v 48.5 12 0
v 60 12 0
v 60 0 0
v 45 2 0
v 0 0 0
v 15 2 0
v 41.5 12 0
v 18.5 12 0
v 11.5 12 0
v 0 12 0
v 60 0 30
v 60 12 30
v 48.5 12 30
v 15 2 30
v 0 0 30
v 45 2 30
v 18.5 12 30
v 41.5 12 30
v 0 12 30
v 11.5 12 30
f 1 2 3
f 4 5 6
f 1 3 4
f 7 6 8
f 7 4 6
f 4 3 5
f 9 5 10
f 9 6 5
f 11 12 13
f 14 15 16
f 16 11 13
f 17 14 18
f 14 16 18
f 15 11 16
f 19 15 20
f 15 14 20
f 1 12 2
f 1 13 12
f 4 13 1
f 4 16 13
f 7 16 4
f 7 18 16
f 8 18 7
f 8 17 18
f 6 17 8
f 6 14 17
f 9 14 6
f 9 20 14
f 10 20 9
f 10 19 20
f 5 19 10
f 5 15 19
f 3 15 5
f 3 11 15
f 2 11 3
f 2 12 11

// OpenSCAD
$fn = 32;

// ----------------------------------------------------------------------
// V guide rail: doublev, 60 mm wide
// ----------------------------------------------------------------------

// --- parameters (mm) ---
rail_w = 60;              // rail width, X
base_t = 12;              // base plate thickness
v_depth = 10;             // V feature depth / height
v_half_w = 7;             // half width of the V at the base face
plate_t = 30;             // rail length, Z (the extrusion height)
groove_off = 15;          // offset of each groove from the centreline

centre_x = rail_w / 2;  // rail centreline
groove_a = centre_x - groove_off;  // axis of the first groove
groove_b = centre_x + groove_off;  // axis of the second groove

profile = [[0, 0], [60, 0], [60, 12], [48.5, 12], [45, 2], [41.5, 12], [18.5, 12], [15, 2], [11.5, 12], [0, 12]];  // primary outline, 10 points, counter clockwise

// --- the one profile operation ---
linear_extrude(height = plate_t) polygon(points = profile);
